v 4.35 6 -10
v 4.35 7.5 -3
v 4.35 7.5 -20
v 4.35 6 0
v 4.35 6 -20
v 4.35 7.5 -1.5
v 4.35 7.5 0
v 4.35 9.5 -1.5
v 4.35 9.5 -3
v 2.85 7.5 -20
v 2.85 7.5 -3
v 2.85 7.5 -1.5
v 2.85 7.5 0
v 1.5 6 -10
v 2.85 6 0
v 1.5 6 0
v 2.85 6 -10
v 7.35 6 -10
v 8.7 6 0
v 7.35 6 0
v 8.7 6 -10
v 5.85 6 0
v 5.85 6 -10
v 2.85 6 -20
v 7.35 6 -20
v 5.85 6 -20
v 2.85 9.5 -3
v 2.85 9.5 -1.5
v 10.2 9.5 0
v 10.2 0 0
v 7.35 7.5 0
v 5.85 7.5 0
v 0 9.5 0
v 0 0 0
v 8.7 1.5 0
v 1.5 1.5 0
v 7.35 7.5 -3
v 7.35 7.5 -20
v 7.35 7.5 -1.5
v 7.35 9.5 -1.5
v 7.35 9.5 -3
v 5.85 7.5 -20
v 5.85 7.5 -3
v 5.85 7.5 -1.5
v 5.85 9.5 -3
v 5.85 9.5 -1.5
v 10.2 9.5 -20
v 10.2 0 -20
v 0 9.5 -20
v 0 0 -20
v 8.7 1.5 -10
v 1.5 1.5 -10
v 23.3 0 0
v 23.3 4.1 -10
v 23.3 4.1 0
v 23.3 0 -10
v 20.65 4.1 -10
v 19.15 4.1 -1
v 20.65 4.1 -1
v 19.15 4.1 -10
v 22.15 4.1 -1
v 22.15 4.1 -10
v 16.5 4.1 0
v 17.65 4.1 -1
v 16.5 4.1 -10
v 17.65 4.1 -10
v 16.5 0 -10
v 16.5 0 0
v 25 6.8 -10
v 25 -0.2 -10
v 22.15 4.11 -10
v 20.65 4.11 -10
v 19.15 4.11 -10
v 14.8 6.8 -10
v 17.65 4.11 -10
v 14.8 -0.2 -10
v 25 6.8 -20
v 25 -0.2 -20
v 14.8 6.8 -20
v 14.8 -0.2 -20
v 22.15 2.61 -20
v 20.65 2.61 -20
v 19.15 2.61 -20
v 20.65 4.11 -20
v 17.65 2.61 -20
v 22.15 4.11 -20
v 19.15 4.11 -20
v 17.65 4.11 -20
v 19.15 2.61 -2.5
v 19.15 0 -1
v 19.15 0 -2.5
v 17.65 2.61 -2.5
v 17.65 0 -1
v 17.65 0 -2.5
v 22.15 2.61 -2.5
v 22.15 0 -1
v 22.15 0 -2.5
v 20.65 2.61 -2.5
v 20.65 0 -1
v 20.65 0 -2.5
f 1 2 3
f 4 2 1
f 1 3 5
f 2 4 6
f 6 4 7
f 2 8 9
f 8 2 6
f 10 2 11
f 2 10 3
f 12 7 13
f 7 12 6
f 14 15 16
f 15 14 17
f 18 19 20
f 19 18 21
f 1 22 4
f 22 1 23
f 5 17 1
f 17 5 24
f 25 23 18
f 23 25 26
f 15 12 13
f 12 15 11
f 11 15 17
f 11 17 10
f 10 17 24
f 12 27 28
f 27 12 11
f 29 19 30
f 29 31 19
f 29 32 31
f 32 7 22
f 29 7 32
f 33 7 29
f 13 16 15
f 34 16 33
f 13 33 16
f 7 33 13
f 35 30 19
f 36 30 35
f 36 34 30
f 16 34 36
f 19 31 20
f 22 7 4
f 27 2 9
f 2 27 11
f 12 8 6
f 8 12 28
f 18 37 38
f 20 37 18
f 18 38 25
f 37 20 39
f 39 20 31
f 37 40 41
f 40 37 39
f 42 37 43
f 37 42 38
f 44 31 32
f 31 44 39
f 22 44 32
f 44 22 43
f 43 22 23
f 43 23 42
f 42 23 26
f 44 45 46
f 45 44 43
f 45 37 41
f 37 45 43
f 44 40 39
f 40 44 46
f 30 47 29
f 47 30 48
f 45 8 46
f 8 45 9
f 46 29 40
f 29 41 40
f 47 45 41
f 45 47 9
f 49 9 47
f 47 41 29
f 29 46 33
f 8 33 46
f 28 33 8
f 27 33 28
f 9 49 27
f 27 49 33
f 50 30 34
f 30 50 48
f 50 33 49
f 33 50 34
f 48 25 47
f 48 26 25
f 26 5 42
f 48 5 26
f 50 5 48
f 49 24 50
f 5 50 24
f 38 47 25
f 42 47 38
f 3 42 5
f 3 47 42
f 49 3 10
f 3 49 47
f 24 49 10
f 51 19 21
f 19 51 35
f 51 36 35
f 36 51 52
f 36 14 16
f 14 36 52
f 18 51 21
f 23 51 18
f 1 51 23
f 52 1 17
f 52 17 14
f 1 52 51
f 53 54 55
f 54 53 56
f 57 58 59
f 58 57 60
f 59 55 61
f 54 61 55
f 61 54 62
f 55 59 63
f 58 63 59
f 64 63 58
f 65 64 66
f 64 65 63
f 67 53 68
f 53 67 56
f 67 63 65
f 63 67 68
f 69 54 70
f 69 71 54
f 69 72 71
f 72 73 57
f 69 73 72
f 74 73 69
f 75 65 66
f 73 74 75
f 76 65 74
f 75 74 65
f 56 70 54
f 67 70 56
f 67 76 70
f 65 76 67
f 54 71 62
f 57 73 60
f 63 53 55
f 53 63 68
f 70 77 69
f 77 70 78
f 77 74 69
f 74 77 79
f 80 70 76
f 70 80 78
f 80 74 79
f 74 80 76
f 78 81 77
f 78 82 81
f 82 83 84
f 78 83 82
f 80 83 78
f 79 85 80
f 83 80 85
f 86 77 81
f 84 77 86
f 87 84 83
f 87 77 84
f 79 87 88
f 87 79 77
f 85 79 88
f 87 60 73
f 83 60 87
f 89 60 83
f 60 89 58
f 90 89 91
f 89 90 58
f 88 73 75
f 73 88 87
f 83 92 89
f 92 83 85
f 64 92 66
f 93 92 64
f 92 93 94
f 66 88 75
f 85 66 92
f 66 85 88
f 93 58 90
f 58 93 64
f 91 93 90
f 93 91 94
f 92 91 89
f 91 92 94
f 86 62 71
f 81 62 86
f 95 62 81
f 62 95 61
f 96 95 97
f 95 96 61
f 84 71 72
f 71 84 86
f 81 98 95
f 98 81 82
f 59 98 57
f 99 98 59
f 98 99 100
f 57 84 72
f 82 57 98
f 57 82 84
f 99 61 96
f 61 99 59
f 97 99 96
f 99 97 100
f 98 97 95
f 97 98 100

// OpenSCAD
// [FL_INDEX: keywords="openscad, 3d_parametric, IKEA_LEDBERG_bar_strip_sockets, csg_solid" | COT="Parametric OpenSCAD design from 3DCodeverse"]
// Title: IKEA LEDBERG bar strip sockets

// Male and female sockets for Ikea LEDBERG LED strips.  These are designed to
// be filled with 22 gauge solid core wire (or similar).  Multi-filament wire
// also works if you twist it. It'll work even better if you tin it. All units
// are in mm.

// Size of male connector. This is the base connector size.
male_x=7;
male_y=10;
male_z=4.3;

// thickness of the outer wall.
wall_thickness=1.5;

// size of female housing.
female_y=20;

// extra height above connector for electronics
female_z_extra=2;
male_z_extra=1;

// The amount of minor offset to make differences work correctly.
diff_offset=.01;

// contact channel width
contact_channel_x=1.5;
contact_channel_y=40;
contact_channel_z=1.5;

// how much of a lip to give the contact channel at the end of the socket
contact_channel_recess_male=1;
// No lip on the female, as it could potentially make the bar get stuck.
contact_channel_recess_female=0;

// The distance between the centers of the two contacts.
contact_channel_separation=3;

// How much extra to add to account for extrusion inaccuracies. This makes the male smaller and the female larger. 0.1 works well on a Lulzbot 0.5mm nozzle, 3mm filament.
extrusion_offset=0.1;

male_contact_z=male_z-contact_channel_z-wall_thickness+diff_offset-extrusion_offset*2;

module contact_channel(x,y,z,recess,end_lock_z,end_lock_z_offset,end_lock_y_offset){
        // one contact left
        translate([(wall_thickness + x/2)-contact_channel_separation/2-contact_channel_x/2,recess,z+wall_thickness]){
            cube([contact_channel_x,contact_channel_y,contact_channel_z]);
	    translate([0,end_lock_y_offset,end_lock_z_offset-wall_thickness]){
		cube([contact_channel_x,contact_channel_x,end_lock_z]);
	    }
        }
        // right contact
        translate([(wall_thickness + x/2)+contact_channel_separation/2-contact_channel_x/2,recess,z+wall_thickness]){
            cube([contact_channel_x,contact_channel_y,contact_channel_z]);
	    translate([0,end_lock_y_offset,end_lock_z_offset-wall_thickness]){
		cube([contact_channel_x,contact_channel_x,end_lock_z]);
	    }
        }
}

module female() {
    difference() {
	// Outer casing
        cube([male_x+wall_thickness*2+extrusion_offset*2,
                female_y,
                male_z+wall_thickness*2 + female_z_extra+extrusion_offset*2]);

	// Socket hole
        translate([wall_thickness,-diff_offset,wall_thickness]){
            cube([male_x + extrusion_offset*2,male_y+diff_offset,male_z + extrusion_offset*2]);
        }
	contact_channel(male_x +extrusion_offset*2,male_y,male_z+ extrusion_offset*2,contact_channel_recess_female,male_z + wall_thickness*2+female_z_extra+extrusion_offset*2,0,wall_thickness);
    }
}

module male(){
    difference(){
        union(){
            translate([wall_thickness,0,0]){
                cube([male_x - extrusion_offset*2, male_y, male_z - extrusion_offset*2]);
            }
            translate([-extrusion_offset*2,male_y,-extrusion_offset*2]){
                cube([male_x+wall_thickness*2 + extrusion_offset*2, male_y, male_z+wall_thickness+male_z_extra+extrusion_offset*2]);
            }
        }
    contact_channel(male_x-extrusion_offset*2,male_y, male_contact_z, contact_channel_recess_male, male_z, -male_contact_z,0);
    }
}

rotation=-90;

// Rotating them -90 degrees made the prints come out the best.
rotate([rotation,0,0]){
    female();
}

translate([15,0,0]){
    rotate([rotation,0,0]){
	male();
    }
}
